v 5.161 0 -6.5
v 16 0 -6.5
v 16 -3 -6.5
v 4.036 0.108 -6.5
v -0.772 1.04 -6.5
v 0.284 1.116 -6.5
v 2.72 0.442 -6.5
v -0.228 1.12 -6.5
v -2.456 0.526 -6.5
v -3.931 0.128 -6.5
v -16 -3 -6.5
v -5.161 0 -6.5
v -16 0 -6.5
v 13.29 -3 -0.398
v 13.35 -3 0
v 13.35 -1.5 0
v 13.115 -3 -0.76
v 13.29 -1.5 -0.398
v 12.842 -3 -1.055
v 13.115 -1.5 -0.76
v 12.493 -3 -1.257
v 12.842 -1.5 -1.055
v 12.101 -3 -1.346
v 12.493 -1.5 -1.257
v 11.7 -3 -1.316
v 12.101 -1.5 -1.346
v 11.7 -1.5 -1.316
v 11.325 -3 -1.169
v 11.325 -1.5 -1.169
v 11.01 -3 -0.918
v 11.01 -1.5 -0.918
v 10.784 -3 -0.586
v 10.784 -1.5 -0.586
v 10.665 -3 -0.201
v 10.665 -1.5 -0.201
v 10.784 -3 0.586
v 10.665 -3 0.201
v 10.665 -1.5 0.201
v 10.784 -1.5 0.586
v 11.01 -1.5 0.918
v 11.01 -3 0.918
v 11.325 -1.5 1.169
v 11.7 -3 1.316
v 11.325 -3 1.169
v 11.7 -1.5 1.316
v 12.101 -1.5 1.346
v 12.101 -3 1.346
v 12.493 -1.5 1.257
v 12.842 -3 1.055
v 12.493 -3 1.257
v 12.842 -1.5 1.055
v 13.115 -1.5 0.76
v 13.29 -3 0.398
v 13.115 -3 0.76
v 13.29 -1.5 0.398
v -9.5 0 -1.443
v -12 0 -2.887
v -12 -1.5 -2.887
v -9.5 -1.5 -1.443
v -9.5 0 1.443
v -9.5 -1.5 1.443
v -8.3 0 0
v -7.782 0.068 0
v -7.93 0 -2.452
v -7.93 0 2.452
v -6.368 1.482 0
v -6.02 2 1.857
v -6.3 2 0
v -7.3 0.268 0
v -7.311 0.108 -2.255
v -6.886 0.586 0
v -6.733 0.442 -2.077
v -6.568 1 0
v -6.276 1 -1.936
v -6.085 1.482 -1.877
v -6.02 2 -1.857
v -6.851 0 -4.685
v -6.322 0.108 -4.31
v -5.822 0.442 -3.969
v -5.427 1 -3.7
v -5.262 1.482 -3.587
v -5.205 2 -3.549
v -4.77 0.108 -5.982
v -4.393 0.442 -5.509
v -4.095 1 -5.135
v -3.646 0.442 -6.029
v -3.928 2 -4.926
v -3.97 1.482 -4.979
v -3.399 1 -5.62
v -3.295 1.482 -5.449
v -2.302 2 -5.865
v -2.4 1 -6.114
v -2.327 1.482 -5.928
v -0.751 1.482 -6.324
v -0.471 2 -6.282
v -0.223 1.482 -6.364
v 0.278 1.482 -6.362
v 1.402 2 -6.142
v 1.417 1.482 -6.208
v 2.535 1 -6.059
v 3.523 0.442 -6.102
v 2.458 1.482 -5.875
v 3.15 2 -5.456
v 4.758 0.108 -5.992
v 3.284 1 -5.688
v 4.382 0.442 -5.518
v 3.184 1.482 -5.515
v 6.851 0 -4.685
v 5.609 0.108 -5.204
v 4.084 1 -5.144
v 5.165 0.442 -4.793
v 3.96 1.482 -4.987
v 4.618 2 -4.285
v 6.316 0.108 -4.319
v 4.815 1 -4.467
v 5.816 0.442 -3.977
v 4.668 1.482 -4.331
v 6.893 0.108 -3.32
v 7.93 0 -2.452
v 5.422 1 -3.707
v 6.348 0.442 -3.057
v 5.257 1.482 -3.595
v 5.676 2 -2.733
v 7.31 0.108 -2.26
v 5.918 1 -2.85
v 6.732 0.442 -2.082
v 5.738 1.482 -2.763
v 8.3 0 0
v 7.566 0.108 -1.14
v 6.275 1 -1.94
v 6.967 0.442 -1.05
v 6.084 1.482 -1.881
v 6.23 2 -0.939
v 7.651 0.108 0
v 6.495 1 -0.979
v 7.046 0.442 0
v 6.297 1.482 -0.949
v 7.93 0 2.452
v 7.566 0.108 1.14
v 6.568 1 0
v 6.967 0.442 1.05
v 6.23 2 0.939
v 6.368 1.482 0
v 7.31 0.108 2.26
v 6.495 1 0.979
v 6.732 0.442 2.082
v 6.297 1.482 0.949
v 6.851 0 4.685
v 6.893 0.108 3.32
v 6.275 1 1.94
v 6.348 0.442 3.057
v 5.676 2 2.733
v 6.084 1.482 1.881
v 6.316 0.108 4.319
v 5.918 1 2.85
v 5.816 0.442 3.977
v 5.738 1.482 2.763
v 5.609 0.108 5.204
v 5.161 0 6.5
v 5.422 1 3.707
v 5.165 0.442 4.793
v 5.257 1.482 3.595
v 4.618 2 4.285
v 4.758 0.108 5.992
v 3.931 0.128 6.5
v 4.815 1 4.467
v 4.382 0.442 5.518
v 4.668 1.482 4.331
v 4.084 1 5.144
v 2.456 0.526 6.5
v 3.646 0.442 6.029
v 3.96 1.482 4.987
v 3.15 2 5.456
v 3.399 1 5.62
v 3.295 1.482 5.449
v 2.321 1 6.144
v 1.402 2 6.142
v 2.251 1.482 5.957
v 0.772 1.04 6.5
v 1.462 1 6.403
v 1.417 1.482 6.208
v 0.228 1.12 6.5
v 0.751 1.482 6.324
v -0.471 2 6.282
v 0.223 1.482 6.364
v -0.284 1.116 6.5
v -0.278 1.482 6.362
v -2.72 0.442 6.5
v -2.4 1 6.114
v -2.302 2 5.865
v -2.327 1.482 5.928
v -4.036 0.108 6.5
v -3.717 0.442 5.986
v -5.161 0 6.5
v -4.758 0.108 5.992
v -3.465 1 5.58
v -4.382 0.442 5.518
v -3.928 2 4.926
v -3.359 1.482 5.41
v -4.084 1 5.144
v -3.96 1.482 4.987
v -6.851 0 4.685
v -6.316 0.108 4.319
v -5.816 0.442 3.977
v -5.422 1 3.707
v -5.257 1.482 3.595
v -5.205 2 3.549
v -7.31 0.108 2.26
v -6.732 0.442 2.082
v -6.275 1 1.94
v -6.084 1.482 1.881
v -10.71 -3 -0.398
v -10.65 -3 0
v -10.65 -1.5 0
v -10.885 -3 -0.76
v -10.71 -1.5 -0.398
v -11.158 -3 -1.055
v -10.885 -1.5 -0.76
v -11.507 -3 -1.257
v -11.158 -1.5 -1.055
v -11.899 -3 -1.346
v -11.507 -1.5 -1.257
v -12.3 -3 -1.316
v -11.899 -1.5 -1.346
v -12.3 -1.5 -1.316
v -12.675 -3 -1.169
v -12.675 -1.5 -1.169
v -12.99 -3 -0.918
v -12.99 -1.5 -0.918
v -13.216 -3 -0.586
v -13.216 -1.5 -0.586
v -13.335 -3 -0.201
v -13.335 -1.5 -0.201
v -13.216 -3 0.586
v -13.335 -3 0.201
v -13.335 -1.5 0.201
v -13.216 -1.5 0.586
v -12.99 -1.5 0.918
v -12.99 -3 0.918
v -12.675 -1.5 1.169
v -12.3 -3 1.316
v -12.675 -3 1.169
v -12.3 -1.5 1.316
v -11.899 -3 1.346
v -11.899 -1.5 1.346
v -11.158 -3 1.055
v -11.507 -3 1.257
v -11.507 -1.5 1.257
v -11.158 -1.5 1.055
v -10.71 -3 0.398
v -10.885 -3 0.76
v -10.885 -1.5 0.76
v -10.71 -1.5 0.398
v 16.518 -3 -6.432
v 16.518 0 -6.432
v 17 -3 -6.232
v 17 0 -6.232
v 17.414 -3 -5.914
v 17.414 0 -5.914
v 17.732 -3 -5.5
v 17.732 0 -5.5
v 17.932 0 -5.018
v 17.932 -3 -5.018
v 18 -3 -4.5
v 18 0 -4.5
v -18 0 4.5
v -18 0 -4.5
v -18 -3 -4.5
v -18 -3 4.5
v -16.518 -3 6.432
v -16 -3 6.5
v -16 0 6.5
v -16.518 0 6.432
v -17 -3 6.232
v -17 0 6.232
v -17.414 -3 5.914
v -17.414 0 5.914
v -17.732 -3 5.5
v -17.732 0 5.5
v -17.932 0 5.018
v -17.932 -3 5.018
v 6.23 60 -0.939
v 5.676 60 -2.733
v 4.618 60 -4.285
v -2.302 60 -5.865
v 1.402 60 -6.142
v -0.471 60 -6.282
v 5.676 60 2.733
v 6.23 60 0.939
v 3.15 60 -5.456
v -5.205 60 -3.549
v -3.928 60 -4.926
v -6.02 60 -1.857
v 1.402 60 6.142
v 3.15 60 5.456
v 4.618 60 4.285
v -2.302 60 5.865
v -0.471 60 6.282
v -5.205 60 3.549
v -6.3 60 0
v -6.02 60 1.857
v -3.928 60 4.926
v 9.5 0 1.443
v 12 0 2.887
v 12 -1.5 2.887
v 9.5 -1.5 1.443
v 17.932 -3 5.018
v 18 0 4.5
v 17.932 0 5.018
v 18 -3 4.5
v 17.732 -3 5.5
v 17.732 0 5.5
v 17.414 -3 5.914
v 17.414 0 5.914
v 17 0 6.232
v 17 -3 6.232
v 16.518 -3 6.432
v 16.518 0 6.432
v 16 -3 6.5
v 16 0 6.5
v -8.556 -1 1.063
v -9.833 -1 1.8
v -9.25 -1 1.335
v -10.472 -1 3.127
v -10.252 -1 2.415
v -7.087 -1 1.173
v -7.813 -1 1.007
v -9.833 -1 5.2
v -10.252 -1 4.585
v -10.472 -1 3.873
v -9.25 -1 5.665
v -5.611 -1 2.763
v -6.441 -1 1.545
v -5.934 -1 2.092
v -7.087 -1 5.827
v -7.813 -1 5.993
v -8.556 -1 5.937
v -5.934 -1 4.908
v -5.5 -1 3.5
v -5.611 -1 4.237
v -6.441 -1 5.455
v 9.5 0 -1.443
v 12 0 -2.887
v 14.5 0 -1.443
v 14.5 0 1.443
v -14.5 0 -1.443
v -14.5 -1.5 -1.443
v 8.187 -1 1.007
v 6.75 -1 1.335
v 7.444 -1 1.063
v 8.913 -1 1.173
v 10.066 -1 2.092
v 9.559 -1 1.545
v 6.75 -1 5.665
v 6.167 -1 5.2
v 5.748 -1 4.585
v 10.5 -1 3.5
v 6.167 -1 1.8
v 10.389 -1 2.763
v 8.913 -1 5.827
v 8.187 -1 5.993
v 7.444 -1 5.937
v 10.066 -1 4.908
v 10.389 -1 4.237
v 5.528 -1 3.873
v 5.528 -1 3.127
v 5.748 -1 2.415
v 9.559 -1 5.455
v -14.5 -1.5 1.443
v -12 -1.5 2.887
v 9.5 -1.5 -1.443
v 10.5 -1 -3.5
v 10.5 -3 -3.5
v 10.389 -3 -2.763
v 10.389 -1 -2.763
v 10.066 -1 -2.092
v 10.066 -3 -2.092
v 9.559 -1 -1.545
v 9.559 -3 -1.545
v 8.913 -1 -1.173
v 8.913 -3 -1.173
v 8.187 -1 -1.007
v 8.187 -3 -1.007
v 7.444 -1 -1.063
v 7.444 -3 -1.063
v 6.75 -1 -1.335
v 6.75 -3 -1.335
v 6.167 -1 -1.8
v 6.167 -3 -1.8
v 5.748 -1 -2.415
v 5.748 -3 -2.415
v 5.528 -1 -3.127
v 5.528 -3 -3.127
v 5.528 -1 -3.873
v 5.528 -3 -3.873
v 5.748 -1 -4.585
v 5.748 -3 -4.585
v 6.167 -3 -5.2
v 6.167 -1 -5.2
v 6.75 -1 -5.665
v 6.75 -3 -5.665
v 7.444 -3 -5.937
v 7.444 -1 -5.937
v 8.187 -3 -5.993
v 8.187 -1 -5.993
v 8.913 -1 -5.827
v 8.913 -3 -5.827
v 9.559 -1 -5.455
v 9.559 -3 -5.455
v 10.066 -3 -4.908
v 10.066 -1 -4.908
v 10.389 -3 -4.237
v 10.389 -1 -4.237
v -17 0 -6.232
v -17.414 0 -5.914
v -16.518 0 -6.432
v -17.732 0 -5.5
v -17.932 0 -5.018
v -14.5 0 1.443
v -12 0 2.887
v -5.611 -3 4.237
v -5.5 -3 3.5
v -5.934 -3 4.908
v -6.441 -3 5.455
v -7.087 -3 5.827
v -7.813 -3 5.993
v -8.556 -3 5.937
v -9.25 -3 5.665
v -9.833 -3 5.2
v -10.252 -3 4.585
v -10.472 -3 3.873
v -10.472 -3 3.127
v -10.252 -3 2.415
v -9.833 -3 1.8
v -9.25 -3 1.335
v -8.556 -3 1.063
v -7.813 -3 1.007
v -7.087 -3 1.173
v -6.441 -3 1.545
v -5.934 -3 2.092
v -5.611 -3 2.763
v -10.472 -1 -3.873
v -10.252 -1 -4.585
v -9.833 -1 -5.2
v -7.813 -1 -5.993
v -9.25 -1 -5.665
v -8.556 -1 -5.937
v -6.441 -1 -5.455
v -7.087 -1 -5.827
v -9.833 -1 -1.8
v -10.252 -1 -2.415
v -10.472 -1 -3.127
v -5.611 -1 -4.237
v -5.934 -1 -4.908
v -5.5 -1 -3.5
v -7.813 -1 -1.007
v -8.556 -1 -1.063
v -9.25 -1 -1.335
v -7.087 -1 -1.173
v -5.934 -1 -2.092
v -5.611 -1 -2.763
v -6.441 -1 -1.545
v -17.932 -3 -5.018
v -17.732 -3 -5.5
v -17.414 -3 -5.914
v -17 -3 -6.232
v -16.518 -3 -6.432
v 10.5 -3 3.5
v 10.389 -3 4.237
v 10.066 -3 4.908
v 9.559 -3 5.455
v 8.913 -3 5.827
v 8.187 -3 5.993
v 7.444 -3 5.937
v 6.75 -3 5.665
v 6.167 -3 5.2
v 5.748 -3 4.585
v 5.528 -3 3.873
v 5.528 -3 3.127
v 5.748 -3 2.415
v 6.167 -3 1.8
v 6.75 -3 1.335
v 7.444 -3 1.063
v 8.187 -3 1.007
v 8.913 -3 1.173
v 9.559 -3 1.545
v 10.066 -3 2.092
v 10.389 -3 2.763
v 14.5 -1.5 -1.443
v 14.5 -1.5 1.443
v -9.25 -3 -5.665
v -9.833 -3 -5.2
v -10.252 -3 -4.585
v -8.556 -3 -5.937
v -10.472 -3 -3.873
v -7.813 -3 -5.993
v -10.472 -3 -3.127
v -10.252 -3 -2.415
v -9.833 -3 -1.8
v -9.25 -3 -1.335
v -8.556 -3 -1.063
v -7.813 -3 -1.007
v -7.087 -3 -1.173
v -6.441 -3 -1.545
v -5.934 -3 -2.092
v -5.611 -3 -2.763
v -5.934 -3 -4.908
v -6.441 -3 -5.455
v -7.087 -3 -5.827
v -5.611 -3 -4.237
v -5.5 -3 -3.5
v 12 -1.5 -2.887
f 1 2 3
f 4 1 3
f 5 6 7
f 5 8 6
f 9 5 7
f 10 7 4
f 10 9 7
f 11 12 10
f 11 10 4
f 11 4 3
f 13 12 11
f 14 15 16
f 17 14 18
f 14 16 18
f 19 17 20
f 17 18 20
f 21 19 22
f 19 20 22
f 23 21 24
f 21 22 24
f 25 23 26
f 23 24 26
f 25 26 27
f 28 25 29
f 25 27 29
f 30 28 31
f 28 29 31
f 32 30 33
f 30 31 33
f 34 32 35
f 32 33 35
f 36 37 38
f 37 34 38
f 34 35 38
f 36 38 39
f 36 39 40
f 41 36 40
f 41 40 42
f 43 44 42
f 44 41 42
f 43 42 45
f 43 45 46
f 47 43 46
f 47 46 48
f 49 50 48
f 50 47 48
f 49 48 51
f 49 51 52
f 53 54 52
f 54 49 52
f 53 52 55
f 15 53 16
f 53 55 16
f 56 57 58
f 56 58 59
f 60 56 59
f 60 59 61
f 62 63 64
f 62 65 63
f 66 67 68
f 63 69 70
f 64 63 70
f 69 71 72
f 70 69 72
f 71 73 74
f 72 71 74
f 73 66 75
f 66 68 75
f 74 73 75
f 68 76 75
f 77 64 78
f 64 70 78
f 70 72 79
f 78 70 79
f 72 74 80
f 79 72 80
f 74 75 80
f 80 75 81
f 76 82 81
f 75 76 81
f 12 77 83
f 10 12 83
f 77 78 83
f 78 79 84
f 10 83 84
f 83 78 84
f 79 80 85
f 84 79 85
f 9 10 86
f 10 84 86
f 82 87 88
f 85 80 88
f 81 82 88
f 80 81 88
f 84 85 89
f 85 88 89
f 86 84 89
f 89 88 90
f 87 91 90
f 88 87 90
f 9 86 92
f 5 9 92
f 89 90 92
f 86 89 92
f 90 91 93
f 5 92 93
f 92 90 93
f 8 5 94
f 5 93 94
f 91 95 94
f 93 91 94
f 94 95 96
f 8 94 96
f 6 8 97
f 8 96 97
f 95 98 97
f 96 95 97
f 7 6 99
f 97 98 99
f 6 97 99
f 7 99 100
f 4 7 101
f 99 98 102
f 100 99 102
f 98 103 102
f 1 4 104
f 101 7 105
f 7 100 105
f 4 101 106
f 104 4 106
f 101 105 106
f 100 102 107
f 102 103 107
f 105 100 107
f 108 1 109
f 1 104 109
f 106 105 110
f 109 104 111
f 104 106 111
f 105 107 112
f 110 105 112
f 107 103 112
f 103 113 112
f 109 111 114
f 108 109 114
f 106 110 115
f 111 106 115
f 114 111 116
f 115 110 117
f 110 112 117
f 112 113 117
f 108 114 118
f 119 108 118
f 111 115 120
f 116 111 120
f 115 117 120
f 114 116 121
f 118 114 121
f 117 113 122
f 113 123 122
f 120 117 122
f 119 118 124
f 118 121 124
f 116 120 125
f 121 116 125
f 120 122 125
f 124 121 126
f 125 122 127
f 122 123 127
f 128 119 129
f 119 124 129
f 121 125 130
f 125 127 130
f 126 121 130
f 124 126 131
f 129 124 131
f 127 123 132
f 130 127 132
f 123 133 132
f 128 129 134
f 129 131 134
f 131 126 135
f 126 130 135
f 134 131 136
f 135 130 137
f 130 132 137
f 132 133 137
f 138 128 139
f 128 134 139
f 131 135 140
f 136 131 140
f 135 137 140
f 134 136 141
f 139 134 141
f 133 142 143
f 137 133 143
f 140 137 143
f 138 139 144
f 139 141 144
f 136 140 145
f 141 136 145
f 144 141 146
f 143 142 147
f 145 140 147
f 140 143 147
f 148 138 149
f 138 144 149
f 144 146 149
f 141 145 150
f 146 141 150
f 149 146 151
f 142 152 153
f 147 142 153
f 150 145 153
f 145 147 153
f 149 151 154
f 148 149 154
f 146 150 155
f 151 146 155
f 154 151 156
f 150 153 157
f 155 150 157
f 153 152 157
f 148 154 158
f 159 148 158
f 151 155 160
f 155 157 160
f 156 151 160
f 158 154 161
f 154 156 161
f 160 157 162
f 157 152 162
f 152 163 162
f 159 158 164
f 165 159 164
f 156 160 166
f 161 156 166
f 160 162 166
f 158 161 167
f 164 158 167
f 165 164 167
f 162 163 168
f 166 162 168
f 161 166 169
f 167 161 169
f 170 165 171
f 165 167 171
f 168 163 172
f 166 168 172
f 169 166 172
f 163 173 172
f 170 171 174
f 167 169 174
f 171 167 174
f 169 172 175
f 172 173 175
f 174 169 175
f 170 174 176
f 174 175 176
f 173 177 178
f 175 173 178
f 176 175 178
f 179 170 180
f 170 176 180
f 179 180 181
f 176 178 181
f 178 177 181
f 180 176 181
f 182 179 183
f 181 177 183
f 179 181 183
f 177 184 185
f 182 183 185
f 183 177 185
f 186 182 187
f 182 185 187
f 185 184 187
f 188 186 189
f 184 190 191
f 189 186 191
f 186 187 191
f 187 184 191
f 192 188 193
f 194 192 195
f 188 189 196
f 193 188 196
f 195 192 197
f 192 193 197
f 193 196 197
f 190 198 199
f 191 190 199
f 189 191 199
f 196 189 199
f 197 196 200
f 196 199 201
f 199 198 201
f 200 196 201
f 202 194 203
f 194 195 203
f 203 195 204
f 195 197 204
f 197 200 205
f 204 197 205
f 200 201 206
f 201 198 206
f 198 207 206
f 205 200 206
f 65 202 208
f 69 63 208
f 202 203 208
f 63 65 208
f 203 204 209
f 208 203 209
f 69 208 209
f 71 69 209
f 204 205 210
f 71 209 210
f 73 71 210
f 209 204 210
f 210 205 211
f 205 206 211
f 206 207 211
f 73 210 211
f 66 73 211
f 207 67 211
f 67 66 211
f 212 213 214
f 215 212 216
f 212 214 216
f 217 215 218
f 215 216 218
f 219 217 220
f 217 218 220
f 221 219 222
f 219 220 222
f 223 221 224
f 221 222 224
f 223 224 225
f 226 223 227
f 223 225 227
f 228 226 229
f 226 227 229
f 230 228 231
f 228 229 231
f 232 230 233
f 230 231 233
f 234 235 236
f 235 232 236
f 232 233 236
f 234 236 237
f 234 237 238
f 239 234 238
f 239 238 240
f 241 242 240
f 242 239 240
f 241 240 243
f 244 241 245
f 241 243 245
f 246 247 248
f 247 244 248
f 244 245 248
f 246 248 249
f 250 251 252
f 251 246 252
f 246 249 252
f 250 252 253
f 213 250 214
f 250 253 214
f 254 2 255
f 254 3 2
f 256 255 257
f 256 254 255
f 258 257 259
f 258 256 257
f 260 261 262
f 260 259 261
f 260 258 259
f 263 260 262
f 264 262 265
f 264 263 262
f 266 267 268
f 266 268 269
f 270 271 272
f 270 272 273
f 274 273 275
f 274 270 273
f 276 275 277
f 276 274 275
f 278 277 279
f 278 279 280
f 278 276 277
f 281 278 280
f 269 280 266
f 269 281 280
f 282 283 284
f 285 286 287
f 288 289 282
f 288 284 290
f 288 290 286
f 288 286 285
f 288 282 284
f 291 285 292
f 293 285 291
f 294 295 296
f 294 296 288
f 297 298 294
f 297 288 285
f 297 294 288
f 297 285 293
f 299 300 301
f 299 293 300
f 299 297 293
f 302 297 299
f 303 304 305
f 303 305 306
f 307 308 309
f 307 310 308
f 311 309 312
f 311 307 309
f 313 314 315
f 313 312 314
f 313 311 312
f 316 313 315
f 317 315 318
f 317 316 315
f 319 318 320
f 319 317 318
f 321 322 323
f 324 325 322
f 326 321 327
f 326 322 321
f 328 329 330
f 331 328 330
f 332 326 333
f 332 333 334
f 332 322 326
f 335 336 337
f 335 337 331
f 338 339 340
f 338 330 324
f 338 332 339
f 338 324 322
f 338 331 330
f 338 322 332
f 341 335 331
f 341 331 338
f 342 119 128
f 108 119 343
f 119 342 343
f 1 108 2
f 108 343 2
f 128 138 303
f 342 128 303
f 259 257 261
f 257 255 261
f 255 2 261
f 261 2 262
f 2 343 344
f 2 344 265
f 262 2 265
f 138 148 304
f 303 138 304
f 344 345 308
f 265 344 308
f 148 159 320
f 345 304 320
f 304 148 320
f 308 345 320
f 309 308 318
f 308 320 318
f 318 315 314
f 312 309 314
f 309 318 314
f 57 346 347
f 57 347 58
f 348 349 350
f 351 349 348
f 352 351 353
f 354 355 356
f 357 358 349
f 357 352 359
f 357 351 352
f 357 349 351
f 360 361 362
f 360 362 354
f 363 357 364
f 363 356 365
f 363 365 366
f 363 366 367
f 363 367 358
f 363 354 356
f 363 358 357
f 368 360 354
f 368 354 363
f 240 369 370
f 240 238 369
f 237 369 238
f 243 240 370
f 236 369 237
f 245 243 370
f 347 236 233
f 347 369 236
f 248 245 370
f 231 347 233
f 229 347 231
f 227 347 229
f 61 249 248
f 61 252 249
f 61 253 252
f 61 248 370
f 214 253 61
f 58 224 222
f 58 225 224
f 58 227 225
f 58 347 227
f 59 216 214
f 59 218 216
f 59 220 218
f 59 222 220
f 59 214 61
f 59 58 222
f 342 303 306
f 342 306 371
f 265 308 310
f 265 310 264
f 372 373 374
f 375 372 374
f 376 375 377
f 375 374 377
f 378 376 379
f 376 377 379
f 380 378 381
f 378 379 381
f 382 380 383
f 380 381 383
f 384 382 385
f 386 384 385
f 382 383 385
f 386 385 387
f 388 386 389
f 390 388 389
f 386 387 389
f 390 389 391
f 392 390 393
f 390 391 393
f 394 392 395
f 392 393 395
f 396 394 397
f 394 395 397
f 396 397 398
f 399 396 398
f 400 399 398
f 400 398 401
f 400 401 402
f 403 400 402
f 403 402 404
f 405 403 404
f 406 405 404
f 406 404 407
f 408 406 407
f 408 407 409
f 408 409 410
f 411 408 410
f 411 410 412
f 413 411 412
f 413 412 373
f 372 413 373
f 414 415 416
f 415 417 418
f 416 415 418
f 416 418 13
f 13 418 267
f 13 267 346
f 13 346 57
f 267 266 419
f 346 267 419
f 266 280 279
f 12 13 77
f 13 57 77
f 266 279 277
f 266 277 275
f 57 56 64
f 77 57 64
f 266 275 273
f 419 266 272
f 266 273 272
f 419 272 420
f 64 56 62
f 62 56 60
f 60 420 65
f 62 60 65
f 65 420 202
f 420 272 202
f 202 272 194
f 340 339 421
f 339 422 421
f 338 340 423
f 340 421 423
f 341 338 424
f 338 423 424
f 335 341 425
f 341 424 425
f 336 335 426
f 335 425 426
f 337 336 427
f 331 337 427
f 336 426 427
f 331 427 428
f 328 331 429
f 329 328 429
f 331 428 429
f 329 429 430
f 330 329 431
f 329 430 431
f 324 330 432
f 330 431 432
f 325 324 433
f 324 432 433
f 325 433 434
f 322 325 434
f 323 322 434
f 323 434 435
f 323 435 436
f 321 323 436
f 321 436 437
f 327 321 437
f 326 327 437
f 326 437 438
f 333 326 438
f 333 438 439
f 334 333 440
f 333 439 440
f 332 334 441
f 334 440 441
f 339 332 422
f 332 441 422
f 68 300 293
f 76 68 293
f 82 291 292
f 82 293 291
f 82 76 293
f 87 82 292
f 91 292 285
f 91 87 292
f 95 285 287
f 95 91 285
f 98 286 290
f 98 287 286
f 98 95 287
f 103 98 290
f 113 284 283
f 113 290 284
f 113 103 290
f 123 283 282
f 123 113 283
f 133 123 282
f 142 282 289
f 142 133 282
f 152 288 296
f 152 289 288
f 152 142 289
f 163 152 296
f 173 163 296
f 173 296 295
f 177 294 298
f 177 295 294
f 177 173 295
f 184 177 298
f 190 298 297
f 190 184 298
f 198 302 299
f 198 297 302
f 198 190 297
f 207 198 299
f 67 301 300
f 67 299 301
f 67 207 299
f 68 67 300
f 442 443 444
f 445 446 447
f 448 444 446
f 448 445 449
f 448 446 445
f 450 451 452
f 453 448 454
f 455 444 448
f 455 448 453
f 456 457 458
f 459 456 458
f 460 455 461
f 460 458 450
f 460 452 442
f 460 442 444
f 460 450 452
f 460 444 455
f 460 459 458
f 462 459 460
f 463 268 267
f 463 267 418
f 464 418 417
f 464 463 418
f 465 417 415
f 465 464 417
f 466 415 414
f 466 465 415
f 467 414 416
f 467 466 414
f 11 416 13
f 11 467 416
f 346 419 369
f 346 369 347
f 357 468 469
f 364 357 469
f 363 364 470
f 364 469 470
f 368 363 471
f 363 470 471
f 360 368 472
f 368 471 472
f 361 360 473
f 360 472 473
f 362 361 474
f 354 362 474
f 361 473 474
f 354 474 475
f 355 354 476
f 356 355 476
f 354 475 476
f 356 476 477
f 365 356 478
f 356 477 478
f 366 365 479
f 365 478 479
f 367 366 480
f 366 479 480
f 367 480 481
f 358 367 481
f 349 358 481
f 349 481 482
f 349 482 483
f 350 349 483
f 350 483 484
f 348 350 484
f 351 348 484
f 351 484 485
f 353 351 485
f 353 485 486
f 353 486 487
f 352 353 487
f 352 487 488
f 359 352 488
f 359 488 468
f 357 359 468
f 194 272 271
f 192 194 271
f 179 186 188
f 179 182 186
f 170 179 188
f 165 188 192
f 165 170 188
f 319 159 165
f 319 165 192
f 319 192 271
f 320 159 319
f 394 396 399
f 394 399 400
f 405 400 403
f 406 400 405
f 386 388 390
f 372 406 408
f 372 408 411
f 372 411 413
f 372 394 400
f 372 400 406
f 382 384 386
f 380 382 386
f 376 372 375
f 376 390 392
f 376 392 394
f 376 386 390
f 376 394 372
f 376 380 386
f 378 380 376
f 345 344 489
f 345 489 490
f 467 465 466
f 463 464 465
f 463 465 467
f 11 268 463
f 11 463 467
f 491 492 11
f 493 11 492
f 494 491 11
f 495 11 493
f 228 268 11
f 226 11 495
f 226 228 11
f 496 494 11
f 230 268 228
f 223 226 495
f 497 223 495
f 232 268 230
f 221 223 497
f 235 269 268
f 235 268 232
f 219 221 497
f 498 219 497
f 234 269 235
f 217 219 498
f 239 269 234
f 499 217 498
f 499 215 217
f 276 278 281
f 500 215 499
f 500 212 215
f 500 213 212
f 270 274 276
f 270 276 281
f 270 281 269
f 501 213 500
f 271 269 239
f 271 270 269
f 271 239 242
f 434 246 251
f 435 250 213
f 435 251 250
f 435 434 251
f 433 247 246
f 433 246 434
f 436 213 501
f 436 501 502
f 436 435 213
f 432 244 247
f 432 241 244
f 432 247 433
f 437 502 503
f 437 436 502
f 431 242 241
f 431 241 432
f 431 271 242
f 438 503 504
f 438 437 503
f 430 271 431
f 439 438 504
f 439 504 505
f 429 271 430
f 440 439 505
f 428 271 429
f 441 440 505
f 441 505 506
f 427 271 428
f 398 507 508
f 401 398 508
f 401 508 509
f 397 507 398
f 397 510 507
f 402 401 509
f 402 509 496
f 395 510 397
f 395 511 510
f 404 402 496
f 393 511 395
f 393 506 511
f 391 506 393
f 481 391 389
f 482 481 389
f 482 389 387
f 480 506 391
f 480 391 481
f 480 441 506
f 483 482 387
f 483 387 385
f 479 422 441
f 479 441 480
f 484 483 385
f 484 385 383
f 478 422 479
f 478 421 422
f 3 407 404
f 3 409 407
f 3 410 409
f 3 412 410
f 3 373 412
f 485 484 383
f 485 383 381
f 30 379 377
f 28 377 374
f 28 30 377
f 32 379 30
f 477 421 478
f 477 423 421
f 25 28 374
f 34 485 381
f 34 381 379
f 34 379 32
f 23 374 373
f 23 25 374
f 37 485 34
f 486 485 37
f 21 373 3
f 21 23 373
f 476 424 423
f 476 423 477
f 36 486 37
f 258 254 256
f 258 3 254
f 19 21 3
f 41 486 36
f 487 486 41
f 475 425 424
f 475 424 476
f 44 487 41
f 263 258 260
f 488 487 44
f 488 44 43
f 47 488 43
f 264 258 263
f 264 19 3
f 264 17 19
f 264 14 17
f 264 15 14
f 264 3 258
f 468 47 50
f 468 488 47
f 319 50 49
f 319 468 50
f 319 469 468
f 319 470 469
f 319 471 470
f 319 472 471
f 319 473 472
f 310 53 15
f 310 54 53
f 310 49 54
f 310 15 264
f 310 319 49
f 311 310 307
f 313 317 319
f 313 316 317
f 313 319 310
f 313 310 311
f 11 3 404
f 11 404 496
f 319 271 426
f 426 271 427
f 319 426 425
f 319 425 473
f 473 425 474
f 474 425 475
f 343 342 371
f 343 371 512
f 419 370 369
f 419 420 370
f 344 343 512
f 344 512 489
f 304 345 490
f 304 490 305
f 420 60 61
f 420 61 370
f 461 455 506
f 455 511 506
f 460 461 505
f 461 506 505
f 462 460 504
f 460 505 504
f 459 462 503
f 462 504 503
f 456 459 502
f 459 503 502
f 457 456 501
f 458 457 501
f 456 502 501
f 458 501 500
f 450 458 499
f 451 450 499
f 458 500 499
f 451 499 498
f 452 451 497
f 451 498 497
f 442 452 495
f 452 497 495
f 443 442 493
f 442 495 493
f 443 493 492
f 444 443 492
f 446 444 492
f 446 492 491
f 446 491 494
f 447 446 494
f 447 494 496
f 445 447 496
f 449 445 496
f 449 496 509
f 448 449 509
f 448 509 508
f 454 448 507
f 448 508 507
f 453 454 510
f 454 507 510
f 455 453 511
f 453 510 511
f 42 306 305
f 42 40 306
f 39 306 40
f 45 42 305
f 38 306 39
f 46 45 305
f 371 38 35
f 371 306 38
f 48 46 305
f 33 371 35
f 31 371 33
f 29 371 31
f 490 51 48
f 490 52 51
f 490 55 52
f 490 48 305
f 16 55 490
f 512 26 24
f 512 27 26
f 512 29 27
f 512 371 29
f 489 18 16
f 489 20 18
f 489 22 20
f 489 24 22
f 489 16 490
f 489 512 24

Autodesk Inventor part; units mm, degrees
ref_plane "YZ Plane" through (0, 0, 0) normal (1, 0, 0) x (0, 1, 0)
ref_plane "XZ Plane" through (0, 0, 0) normal (0, 1, 0) x (-1, 0, 0)
ref_plane "XY Plane" through (0, 0, 0) normal (0, 0, 1) x (1, 0, 0)
sketch "Sketch1" plane through (0, 0, 0) normal (0, 1, 0) x (-1, 0, 0)
  circle A0 centre (0, 0) radius 6.3
  dimension "d0" = 12.6
extrude "Extrusion1" add sketch "Sketch1" along normal blind 60
sketch "Sketch2" plane through (0, 0, 0) normal (0, -1, 0) x (1, 0, 0)
  line L0 (-18, 6.5) -> (18, 6.5)
  line L1 (18, 6.5) -> (18, -6.5)
  line L2 (18, -6.5) -> (-18, -6.5)
  line L3 (-18, -6.5) -> (-18, 6.5)
  line L4 (-18, 6.5) -> (18, -6.5) construction
  line L5 (18, 6.5) -> (-18, -6.5) construction
  circle A0 centre (12, 0) radius 1.35
  line L6 (0, 0) -> (0, 6.5) construction
  circle A1 centre (-12, 0) radius 1.35
  dimension "d3" = 2.7
  dimension "d4" = 12
  dimension "d5" = 36
  dimension "d6" = 13
extrude "Extrusion2" add sketch "Sketch2" along normal blind 3
fillet "Fillet1" radius 2 1 edges at (6.3, 0, 0)
fillet "Fillet2" radius 2 4 edges at (-18, -1.5, 6.5) (-18, -1.5, -6.5) (18, -1.5, 6.5) (18, -1.5, -6.5)
sketch "Sketch3" plane through (0, 0, 0) normal (0, 1, 0) x (1, 0, 0)
  circle A0 centre (12, 0) radius 1.35 projected
  line L0 (9.5, 1.4434) -> (12, 2.8868)
  line L1 (12, 2.8868) -> (14.5, 1.4434)
  line L2 (14.5, 1.4434) -> (14.5, -1.4434)
  line L3 (14.5, -1.4434) -> (12, -2.8868)
  line L4 (12, -2.8868) -> (9.5, -1.4434)
  line L5 (9.5, -1.4434) -> (9.5, 1.4434)
  circle A1 centre (-12, 0) radius 1.35 projected
  line L6 (-14.5, 1.4434) -> (-12, 2.8868)
  line L7 (-12, 2.8868) -> (-9.5, 1.4434)
  line L8 (-9.5, 1.4434) -> (-9.5, -1.4434)
  line L9 (-9.5, -1.4434) -> (-12, -2.8868)
  line L10 (-12, -2.8868) -> (-14.5, -1.4434)
  line L11 (-14.5, -1.4434) -> (-14.5, 1.4434)
  line L12 (18, 4.5) -> (18, -4.5) projected
  line L13 (-18, -4.5) -> (-18, 4.5) projected
  point P0 (0, 0)
  dimension "d11" = 5
  dimension "d12" = 5
extrude "Extrusion3" cut sketch "Sketch3" against normal blind 1.5
sketch "Sketch4" plane through (0, -3, 0) normal (0, -1, 0) x (1, 0, 0)
  circle A0 centre (-8, -3.5) radius 2.5
  circle A1 centre (-8, 3.5) radius 2.5
  circle A2 centre (-12, 0) radius 1.35 projected
  line L0 (0, 0) -> (0, 6.4158) construction
  circle A3 centre (8, -3.5) radius 2.5
  circle A4 centre (8, 3.5) radius 2.5
  circle A5 centre (12, 0) radius 1.35
  dimension "d15" = 5
  dimension "d16" = 5
  dimension "d17" = 4
  dimension "d18" = 3.5
  dimension "d19" = 4
  dimension "d20" = 3.5
extrude "Extrusion4" cut sketch "Sketch4" against normal blind 2 contours A0 | A1 | A3 | A4
properties part number "PWM3360 holder"
